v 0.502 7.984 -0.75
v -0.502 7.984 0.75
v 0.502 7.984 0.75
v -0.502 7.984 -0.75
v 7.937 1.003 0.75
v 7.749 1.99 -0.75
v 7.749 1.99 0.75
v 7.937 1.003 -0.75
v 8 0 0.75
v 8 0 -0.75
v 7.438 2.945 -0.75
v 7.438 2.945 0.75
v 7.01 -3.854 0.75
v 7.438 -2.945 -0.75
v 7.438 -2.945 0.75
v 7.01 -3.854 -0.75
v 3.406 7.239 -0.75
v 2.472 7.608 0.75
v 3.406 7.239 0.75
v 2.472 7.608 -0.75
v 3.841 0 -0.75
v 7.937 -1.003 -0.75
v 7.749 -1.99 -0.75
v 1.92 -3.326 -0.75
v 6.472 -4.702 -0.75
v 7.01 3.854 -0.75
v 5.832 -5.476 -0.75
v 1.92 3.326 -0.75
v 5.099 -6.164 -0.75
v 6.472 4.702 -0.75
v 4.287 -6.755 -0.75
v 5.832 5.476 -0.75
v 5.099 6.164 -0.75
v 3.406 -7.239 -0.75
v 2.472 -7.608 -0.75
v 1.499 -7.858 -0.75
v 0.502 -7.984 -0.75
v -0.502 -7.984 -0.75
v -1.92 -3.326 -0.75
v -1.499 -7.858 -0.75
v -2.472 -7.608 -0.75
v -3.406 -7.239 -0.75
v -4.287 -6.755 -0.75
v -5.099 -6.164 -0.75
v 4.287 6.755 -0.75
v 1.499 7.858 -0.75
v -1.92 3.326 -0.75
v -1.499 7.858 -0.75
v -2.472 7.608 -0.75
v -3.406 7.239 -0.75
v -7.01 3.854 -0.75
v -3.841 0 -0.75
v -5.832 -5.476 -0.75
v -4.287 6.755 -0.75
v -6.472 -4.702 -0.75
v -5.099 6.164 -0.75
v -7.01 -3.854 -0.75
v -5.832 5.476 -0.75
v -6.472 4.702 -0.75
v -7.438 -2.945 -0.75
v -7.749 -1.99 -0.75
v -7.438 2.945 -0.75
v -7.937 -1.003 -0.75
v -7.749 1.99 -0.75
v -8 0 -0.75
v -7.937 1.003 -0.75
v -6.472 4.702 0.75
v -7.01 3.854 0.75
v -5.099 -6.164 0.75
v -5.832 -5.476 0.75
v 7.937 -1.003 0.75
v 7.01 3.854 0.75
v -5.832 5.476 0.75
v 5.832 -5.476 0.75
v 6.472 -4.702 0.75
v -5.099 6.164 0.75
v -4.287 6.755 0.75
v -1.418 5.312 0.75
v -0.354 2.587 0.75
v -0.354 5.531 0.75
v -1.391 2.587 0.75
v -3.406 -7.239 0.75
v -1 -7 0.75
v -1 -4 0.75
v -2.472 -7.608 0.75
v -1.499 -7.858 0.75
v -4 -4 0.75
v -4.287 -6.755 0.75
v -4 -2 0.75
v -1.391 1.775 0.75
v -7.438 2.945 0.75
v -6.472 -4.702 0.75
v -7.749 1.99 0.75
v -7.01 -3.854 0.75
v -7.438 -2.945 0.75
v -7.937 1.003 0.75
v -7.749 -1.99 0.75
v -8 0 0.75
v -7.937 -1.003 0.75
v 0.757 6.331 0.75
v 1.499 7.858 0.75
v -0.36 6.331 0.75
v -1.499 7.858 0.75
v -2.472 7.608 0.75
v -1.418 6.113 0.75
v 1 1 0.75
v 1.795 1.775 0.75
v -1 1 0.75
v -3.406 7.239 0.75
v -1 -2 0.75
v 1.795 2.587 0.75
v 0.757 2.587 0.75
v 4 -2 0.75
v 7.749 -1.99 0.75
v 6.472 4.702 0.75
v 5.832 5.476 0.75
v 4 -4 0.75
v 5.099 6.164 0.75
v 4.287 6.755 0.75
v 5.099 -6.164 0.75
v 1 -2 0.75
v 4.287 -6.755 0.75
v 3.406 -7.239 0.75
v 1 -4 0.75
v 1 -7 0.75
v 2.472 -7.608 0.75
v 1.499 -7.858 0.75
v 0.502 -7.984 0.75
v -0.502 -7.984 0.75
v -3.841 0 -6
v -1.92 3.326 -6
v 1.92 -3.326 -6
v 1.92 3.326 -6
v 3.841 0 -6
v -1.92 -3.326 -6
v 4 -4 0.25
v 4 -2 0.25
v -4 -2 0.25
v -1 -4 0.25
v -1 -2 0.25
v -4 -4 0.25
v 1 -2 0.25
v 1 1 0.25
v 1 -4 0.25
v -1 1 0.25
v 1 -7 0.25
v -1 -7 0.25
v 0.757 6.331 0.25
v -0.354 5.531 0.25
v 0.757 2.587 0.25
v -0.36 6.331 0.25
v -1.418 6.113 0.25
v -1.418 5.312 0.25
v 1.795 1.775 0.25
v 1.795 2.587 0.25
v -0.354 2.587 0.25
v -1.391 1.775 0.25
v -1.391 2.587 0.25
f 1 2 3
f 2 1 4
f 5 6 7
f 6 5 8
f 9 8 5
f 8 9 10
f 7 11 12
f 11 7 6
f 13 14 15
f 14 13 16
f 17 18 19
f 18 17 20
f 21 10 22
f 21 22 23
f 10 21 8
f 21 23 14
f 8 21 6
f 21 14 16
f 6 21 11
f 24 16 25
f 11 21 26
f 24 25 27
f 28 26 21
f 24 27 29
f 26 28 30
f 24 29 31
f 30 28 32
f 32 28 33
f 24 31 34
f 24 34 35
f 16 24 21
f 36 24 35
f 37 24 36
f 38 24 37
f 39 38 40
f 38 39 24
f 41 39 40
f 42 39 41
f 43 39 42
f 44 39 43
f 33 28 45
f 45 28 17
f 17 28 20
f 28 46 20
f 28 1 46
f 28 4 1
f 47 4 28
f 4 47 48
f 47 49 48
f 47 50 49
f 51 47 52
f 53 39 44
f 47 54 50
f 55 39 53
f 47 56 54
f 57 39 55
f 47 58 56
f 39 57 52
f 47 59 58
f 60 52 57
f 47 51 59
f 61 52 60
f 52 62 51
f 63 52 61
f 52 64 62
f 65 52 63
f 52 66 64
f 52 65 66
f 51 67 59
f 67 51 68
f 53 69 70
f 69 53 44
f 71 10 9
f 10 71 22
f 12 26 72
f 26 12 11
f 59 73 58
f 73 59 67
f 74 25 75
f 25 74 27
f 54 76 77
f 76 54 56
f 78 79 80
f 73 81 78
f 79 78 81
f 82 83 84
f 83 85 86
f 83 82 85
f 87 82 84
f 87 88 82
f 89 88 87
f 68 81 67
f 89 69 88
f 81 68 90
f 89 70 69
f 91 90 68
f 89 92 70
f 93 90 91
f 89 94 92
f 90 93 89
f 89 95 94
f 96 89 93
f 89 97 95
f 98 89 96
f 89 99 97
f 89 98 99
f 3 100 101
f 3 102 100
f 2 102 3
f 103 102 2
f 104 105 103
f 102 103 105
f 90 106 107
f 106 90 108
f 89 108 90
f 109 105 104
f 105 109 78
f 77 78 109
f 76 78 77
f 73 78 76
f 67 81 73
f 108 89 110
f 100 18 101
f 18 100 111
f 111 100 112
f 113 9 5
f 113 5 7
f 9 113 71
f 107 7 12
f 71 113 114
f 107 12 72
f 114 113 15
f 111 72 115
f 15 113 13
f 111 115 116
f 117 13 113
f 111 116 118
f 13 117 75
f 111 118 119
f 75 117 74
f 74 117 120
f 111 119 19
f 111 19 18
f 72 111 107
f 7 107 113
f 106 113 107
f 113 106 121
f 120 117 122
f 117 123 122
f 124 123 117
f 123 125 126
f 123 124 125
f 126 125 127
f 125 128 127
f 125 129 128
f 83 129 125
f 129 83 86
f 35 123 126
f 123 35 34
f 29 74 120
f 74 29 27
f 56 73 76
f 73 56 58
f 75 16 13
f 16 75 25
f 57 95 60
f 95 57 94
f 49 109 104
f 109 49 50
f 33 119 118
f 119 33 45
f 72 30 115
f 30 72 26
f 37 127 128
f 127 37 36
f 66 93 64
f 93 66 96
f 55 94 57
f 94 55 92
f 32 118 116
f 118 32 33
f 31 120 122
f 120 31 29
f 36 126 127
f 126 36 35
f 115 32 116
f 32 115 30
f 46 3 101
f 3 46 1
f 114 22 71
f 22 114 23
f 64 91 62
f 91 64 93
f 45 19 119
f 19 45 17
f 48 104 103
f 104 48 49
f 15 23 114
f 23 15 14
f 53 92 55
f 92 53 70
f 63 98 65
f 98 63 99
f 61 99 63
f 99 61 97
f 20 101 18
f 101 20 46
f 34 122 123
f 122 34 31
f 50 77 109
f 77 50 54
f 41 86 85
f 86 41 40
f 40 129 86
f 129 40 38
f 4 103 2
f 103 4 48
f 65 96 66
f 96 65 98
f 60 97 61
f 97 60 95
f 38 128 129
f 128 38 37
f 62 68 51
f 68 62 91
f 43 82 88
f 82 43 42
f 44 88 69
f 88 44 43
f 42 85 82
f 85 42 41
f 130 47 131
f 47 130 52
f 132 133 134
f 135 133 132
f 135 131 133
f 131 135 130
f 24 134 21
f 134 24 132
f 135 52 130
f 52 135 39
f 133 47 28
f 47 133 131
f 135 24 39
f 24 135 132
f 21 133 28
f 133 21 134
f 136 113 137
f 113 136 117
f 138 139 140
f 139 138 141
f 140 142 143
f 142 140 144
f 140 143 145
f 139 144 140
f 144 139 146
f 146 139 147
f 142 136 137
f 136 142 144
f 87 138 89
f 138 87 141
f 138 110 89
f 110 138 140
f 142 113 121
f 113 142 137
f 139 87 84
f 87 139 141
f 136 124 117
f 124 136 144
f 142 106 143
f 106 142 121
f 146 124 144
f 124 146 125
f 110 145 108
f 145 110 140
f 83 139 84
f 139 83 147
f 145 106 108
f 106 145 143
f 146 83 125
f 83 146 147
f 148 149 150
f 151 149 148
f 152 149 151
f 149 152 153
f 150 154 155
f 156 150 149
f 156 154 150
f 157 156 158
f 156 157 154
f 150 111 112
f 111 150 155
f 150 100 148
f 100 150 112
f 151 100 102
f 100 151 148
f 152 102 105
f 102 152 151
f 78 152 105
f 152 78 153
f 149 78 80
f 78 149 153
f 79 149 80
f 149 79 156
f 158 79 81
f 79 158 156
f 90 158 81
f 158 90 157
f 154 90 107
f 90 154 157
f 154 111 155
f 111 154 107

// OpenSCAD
$fn = 50;


difference() {
	union() {
		translate(v = [0, 0, -0.7500000000]) {
			cylinder(h = 1.5000000000, r = 8.0000000000);
		}
		translate(v = [0, 0, -6]) {
			linear_extrude(height = 6) {
				polygon(points = [[3.8408550000, 0.0000000000], [1.9204275000, 3.3262780023], [-1.9204275000, 3.3262780023], [-3.8408550000, 0.0000000000], [-1.9204275000, -3.3262780023], [1.9204275000, -3.3262780023]]);
			}
		}
	}
	union() {
		#translate(v = [-4.0000000000, -4.0000000000, 0.2500000000]) {
			cube(size = [8, 2, 0.5000000000]);
		}
		#translate(v = [-1.0000000000, -7.0000000000, 0.2500000000]) {
			cube(size = [2, 8, 0.5000000000]);
		}
		#translate(v = [0, 4, 0.2500000000]) {
			linear_extrude(height = 0.5000000000) {
				text(font = "SegoiUI:Bold", halign = "center", size = 4.5000000000, text = "1", valign = "center");
			}
		}
	}
}
